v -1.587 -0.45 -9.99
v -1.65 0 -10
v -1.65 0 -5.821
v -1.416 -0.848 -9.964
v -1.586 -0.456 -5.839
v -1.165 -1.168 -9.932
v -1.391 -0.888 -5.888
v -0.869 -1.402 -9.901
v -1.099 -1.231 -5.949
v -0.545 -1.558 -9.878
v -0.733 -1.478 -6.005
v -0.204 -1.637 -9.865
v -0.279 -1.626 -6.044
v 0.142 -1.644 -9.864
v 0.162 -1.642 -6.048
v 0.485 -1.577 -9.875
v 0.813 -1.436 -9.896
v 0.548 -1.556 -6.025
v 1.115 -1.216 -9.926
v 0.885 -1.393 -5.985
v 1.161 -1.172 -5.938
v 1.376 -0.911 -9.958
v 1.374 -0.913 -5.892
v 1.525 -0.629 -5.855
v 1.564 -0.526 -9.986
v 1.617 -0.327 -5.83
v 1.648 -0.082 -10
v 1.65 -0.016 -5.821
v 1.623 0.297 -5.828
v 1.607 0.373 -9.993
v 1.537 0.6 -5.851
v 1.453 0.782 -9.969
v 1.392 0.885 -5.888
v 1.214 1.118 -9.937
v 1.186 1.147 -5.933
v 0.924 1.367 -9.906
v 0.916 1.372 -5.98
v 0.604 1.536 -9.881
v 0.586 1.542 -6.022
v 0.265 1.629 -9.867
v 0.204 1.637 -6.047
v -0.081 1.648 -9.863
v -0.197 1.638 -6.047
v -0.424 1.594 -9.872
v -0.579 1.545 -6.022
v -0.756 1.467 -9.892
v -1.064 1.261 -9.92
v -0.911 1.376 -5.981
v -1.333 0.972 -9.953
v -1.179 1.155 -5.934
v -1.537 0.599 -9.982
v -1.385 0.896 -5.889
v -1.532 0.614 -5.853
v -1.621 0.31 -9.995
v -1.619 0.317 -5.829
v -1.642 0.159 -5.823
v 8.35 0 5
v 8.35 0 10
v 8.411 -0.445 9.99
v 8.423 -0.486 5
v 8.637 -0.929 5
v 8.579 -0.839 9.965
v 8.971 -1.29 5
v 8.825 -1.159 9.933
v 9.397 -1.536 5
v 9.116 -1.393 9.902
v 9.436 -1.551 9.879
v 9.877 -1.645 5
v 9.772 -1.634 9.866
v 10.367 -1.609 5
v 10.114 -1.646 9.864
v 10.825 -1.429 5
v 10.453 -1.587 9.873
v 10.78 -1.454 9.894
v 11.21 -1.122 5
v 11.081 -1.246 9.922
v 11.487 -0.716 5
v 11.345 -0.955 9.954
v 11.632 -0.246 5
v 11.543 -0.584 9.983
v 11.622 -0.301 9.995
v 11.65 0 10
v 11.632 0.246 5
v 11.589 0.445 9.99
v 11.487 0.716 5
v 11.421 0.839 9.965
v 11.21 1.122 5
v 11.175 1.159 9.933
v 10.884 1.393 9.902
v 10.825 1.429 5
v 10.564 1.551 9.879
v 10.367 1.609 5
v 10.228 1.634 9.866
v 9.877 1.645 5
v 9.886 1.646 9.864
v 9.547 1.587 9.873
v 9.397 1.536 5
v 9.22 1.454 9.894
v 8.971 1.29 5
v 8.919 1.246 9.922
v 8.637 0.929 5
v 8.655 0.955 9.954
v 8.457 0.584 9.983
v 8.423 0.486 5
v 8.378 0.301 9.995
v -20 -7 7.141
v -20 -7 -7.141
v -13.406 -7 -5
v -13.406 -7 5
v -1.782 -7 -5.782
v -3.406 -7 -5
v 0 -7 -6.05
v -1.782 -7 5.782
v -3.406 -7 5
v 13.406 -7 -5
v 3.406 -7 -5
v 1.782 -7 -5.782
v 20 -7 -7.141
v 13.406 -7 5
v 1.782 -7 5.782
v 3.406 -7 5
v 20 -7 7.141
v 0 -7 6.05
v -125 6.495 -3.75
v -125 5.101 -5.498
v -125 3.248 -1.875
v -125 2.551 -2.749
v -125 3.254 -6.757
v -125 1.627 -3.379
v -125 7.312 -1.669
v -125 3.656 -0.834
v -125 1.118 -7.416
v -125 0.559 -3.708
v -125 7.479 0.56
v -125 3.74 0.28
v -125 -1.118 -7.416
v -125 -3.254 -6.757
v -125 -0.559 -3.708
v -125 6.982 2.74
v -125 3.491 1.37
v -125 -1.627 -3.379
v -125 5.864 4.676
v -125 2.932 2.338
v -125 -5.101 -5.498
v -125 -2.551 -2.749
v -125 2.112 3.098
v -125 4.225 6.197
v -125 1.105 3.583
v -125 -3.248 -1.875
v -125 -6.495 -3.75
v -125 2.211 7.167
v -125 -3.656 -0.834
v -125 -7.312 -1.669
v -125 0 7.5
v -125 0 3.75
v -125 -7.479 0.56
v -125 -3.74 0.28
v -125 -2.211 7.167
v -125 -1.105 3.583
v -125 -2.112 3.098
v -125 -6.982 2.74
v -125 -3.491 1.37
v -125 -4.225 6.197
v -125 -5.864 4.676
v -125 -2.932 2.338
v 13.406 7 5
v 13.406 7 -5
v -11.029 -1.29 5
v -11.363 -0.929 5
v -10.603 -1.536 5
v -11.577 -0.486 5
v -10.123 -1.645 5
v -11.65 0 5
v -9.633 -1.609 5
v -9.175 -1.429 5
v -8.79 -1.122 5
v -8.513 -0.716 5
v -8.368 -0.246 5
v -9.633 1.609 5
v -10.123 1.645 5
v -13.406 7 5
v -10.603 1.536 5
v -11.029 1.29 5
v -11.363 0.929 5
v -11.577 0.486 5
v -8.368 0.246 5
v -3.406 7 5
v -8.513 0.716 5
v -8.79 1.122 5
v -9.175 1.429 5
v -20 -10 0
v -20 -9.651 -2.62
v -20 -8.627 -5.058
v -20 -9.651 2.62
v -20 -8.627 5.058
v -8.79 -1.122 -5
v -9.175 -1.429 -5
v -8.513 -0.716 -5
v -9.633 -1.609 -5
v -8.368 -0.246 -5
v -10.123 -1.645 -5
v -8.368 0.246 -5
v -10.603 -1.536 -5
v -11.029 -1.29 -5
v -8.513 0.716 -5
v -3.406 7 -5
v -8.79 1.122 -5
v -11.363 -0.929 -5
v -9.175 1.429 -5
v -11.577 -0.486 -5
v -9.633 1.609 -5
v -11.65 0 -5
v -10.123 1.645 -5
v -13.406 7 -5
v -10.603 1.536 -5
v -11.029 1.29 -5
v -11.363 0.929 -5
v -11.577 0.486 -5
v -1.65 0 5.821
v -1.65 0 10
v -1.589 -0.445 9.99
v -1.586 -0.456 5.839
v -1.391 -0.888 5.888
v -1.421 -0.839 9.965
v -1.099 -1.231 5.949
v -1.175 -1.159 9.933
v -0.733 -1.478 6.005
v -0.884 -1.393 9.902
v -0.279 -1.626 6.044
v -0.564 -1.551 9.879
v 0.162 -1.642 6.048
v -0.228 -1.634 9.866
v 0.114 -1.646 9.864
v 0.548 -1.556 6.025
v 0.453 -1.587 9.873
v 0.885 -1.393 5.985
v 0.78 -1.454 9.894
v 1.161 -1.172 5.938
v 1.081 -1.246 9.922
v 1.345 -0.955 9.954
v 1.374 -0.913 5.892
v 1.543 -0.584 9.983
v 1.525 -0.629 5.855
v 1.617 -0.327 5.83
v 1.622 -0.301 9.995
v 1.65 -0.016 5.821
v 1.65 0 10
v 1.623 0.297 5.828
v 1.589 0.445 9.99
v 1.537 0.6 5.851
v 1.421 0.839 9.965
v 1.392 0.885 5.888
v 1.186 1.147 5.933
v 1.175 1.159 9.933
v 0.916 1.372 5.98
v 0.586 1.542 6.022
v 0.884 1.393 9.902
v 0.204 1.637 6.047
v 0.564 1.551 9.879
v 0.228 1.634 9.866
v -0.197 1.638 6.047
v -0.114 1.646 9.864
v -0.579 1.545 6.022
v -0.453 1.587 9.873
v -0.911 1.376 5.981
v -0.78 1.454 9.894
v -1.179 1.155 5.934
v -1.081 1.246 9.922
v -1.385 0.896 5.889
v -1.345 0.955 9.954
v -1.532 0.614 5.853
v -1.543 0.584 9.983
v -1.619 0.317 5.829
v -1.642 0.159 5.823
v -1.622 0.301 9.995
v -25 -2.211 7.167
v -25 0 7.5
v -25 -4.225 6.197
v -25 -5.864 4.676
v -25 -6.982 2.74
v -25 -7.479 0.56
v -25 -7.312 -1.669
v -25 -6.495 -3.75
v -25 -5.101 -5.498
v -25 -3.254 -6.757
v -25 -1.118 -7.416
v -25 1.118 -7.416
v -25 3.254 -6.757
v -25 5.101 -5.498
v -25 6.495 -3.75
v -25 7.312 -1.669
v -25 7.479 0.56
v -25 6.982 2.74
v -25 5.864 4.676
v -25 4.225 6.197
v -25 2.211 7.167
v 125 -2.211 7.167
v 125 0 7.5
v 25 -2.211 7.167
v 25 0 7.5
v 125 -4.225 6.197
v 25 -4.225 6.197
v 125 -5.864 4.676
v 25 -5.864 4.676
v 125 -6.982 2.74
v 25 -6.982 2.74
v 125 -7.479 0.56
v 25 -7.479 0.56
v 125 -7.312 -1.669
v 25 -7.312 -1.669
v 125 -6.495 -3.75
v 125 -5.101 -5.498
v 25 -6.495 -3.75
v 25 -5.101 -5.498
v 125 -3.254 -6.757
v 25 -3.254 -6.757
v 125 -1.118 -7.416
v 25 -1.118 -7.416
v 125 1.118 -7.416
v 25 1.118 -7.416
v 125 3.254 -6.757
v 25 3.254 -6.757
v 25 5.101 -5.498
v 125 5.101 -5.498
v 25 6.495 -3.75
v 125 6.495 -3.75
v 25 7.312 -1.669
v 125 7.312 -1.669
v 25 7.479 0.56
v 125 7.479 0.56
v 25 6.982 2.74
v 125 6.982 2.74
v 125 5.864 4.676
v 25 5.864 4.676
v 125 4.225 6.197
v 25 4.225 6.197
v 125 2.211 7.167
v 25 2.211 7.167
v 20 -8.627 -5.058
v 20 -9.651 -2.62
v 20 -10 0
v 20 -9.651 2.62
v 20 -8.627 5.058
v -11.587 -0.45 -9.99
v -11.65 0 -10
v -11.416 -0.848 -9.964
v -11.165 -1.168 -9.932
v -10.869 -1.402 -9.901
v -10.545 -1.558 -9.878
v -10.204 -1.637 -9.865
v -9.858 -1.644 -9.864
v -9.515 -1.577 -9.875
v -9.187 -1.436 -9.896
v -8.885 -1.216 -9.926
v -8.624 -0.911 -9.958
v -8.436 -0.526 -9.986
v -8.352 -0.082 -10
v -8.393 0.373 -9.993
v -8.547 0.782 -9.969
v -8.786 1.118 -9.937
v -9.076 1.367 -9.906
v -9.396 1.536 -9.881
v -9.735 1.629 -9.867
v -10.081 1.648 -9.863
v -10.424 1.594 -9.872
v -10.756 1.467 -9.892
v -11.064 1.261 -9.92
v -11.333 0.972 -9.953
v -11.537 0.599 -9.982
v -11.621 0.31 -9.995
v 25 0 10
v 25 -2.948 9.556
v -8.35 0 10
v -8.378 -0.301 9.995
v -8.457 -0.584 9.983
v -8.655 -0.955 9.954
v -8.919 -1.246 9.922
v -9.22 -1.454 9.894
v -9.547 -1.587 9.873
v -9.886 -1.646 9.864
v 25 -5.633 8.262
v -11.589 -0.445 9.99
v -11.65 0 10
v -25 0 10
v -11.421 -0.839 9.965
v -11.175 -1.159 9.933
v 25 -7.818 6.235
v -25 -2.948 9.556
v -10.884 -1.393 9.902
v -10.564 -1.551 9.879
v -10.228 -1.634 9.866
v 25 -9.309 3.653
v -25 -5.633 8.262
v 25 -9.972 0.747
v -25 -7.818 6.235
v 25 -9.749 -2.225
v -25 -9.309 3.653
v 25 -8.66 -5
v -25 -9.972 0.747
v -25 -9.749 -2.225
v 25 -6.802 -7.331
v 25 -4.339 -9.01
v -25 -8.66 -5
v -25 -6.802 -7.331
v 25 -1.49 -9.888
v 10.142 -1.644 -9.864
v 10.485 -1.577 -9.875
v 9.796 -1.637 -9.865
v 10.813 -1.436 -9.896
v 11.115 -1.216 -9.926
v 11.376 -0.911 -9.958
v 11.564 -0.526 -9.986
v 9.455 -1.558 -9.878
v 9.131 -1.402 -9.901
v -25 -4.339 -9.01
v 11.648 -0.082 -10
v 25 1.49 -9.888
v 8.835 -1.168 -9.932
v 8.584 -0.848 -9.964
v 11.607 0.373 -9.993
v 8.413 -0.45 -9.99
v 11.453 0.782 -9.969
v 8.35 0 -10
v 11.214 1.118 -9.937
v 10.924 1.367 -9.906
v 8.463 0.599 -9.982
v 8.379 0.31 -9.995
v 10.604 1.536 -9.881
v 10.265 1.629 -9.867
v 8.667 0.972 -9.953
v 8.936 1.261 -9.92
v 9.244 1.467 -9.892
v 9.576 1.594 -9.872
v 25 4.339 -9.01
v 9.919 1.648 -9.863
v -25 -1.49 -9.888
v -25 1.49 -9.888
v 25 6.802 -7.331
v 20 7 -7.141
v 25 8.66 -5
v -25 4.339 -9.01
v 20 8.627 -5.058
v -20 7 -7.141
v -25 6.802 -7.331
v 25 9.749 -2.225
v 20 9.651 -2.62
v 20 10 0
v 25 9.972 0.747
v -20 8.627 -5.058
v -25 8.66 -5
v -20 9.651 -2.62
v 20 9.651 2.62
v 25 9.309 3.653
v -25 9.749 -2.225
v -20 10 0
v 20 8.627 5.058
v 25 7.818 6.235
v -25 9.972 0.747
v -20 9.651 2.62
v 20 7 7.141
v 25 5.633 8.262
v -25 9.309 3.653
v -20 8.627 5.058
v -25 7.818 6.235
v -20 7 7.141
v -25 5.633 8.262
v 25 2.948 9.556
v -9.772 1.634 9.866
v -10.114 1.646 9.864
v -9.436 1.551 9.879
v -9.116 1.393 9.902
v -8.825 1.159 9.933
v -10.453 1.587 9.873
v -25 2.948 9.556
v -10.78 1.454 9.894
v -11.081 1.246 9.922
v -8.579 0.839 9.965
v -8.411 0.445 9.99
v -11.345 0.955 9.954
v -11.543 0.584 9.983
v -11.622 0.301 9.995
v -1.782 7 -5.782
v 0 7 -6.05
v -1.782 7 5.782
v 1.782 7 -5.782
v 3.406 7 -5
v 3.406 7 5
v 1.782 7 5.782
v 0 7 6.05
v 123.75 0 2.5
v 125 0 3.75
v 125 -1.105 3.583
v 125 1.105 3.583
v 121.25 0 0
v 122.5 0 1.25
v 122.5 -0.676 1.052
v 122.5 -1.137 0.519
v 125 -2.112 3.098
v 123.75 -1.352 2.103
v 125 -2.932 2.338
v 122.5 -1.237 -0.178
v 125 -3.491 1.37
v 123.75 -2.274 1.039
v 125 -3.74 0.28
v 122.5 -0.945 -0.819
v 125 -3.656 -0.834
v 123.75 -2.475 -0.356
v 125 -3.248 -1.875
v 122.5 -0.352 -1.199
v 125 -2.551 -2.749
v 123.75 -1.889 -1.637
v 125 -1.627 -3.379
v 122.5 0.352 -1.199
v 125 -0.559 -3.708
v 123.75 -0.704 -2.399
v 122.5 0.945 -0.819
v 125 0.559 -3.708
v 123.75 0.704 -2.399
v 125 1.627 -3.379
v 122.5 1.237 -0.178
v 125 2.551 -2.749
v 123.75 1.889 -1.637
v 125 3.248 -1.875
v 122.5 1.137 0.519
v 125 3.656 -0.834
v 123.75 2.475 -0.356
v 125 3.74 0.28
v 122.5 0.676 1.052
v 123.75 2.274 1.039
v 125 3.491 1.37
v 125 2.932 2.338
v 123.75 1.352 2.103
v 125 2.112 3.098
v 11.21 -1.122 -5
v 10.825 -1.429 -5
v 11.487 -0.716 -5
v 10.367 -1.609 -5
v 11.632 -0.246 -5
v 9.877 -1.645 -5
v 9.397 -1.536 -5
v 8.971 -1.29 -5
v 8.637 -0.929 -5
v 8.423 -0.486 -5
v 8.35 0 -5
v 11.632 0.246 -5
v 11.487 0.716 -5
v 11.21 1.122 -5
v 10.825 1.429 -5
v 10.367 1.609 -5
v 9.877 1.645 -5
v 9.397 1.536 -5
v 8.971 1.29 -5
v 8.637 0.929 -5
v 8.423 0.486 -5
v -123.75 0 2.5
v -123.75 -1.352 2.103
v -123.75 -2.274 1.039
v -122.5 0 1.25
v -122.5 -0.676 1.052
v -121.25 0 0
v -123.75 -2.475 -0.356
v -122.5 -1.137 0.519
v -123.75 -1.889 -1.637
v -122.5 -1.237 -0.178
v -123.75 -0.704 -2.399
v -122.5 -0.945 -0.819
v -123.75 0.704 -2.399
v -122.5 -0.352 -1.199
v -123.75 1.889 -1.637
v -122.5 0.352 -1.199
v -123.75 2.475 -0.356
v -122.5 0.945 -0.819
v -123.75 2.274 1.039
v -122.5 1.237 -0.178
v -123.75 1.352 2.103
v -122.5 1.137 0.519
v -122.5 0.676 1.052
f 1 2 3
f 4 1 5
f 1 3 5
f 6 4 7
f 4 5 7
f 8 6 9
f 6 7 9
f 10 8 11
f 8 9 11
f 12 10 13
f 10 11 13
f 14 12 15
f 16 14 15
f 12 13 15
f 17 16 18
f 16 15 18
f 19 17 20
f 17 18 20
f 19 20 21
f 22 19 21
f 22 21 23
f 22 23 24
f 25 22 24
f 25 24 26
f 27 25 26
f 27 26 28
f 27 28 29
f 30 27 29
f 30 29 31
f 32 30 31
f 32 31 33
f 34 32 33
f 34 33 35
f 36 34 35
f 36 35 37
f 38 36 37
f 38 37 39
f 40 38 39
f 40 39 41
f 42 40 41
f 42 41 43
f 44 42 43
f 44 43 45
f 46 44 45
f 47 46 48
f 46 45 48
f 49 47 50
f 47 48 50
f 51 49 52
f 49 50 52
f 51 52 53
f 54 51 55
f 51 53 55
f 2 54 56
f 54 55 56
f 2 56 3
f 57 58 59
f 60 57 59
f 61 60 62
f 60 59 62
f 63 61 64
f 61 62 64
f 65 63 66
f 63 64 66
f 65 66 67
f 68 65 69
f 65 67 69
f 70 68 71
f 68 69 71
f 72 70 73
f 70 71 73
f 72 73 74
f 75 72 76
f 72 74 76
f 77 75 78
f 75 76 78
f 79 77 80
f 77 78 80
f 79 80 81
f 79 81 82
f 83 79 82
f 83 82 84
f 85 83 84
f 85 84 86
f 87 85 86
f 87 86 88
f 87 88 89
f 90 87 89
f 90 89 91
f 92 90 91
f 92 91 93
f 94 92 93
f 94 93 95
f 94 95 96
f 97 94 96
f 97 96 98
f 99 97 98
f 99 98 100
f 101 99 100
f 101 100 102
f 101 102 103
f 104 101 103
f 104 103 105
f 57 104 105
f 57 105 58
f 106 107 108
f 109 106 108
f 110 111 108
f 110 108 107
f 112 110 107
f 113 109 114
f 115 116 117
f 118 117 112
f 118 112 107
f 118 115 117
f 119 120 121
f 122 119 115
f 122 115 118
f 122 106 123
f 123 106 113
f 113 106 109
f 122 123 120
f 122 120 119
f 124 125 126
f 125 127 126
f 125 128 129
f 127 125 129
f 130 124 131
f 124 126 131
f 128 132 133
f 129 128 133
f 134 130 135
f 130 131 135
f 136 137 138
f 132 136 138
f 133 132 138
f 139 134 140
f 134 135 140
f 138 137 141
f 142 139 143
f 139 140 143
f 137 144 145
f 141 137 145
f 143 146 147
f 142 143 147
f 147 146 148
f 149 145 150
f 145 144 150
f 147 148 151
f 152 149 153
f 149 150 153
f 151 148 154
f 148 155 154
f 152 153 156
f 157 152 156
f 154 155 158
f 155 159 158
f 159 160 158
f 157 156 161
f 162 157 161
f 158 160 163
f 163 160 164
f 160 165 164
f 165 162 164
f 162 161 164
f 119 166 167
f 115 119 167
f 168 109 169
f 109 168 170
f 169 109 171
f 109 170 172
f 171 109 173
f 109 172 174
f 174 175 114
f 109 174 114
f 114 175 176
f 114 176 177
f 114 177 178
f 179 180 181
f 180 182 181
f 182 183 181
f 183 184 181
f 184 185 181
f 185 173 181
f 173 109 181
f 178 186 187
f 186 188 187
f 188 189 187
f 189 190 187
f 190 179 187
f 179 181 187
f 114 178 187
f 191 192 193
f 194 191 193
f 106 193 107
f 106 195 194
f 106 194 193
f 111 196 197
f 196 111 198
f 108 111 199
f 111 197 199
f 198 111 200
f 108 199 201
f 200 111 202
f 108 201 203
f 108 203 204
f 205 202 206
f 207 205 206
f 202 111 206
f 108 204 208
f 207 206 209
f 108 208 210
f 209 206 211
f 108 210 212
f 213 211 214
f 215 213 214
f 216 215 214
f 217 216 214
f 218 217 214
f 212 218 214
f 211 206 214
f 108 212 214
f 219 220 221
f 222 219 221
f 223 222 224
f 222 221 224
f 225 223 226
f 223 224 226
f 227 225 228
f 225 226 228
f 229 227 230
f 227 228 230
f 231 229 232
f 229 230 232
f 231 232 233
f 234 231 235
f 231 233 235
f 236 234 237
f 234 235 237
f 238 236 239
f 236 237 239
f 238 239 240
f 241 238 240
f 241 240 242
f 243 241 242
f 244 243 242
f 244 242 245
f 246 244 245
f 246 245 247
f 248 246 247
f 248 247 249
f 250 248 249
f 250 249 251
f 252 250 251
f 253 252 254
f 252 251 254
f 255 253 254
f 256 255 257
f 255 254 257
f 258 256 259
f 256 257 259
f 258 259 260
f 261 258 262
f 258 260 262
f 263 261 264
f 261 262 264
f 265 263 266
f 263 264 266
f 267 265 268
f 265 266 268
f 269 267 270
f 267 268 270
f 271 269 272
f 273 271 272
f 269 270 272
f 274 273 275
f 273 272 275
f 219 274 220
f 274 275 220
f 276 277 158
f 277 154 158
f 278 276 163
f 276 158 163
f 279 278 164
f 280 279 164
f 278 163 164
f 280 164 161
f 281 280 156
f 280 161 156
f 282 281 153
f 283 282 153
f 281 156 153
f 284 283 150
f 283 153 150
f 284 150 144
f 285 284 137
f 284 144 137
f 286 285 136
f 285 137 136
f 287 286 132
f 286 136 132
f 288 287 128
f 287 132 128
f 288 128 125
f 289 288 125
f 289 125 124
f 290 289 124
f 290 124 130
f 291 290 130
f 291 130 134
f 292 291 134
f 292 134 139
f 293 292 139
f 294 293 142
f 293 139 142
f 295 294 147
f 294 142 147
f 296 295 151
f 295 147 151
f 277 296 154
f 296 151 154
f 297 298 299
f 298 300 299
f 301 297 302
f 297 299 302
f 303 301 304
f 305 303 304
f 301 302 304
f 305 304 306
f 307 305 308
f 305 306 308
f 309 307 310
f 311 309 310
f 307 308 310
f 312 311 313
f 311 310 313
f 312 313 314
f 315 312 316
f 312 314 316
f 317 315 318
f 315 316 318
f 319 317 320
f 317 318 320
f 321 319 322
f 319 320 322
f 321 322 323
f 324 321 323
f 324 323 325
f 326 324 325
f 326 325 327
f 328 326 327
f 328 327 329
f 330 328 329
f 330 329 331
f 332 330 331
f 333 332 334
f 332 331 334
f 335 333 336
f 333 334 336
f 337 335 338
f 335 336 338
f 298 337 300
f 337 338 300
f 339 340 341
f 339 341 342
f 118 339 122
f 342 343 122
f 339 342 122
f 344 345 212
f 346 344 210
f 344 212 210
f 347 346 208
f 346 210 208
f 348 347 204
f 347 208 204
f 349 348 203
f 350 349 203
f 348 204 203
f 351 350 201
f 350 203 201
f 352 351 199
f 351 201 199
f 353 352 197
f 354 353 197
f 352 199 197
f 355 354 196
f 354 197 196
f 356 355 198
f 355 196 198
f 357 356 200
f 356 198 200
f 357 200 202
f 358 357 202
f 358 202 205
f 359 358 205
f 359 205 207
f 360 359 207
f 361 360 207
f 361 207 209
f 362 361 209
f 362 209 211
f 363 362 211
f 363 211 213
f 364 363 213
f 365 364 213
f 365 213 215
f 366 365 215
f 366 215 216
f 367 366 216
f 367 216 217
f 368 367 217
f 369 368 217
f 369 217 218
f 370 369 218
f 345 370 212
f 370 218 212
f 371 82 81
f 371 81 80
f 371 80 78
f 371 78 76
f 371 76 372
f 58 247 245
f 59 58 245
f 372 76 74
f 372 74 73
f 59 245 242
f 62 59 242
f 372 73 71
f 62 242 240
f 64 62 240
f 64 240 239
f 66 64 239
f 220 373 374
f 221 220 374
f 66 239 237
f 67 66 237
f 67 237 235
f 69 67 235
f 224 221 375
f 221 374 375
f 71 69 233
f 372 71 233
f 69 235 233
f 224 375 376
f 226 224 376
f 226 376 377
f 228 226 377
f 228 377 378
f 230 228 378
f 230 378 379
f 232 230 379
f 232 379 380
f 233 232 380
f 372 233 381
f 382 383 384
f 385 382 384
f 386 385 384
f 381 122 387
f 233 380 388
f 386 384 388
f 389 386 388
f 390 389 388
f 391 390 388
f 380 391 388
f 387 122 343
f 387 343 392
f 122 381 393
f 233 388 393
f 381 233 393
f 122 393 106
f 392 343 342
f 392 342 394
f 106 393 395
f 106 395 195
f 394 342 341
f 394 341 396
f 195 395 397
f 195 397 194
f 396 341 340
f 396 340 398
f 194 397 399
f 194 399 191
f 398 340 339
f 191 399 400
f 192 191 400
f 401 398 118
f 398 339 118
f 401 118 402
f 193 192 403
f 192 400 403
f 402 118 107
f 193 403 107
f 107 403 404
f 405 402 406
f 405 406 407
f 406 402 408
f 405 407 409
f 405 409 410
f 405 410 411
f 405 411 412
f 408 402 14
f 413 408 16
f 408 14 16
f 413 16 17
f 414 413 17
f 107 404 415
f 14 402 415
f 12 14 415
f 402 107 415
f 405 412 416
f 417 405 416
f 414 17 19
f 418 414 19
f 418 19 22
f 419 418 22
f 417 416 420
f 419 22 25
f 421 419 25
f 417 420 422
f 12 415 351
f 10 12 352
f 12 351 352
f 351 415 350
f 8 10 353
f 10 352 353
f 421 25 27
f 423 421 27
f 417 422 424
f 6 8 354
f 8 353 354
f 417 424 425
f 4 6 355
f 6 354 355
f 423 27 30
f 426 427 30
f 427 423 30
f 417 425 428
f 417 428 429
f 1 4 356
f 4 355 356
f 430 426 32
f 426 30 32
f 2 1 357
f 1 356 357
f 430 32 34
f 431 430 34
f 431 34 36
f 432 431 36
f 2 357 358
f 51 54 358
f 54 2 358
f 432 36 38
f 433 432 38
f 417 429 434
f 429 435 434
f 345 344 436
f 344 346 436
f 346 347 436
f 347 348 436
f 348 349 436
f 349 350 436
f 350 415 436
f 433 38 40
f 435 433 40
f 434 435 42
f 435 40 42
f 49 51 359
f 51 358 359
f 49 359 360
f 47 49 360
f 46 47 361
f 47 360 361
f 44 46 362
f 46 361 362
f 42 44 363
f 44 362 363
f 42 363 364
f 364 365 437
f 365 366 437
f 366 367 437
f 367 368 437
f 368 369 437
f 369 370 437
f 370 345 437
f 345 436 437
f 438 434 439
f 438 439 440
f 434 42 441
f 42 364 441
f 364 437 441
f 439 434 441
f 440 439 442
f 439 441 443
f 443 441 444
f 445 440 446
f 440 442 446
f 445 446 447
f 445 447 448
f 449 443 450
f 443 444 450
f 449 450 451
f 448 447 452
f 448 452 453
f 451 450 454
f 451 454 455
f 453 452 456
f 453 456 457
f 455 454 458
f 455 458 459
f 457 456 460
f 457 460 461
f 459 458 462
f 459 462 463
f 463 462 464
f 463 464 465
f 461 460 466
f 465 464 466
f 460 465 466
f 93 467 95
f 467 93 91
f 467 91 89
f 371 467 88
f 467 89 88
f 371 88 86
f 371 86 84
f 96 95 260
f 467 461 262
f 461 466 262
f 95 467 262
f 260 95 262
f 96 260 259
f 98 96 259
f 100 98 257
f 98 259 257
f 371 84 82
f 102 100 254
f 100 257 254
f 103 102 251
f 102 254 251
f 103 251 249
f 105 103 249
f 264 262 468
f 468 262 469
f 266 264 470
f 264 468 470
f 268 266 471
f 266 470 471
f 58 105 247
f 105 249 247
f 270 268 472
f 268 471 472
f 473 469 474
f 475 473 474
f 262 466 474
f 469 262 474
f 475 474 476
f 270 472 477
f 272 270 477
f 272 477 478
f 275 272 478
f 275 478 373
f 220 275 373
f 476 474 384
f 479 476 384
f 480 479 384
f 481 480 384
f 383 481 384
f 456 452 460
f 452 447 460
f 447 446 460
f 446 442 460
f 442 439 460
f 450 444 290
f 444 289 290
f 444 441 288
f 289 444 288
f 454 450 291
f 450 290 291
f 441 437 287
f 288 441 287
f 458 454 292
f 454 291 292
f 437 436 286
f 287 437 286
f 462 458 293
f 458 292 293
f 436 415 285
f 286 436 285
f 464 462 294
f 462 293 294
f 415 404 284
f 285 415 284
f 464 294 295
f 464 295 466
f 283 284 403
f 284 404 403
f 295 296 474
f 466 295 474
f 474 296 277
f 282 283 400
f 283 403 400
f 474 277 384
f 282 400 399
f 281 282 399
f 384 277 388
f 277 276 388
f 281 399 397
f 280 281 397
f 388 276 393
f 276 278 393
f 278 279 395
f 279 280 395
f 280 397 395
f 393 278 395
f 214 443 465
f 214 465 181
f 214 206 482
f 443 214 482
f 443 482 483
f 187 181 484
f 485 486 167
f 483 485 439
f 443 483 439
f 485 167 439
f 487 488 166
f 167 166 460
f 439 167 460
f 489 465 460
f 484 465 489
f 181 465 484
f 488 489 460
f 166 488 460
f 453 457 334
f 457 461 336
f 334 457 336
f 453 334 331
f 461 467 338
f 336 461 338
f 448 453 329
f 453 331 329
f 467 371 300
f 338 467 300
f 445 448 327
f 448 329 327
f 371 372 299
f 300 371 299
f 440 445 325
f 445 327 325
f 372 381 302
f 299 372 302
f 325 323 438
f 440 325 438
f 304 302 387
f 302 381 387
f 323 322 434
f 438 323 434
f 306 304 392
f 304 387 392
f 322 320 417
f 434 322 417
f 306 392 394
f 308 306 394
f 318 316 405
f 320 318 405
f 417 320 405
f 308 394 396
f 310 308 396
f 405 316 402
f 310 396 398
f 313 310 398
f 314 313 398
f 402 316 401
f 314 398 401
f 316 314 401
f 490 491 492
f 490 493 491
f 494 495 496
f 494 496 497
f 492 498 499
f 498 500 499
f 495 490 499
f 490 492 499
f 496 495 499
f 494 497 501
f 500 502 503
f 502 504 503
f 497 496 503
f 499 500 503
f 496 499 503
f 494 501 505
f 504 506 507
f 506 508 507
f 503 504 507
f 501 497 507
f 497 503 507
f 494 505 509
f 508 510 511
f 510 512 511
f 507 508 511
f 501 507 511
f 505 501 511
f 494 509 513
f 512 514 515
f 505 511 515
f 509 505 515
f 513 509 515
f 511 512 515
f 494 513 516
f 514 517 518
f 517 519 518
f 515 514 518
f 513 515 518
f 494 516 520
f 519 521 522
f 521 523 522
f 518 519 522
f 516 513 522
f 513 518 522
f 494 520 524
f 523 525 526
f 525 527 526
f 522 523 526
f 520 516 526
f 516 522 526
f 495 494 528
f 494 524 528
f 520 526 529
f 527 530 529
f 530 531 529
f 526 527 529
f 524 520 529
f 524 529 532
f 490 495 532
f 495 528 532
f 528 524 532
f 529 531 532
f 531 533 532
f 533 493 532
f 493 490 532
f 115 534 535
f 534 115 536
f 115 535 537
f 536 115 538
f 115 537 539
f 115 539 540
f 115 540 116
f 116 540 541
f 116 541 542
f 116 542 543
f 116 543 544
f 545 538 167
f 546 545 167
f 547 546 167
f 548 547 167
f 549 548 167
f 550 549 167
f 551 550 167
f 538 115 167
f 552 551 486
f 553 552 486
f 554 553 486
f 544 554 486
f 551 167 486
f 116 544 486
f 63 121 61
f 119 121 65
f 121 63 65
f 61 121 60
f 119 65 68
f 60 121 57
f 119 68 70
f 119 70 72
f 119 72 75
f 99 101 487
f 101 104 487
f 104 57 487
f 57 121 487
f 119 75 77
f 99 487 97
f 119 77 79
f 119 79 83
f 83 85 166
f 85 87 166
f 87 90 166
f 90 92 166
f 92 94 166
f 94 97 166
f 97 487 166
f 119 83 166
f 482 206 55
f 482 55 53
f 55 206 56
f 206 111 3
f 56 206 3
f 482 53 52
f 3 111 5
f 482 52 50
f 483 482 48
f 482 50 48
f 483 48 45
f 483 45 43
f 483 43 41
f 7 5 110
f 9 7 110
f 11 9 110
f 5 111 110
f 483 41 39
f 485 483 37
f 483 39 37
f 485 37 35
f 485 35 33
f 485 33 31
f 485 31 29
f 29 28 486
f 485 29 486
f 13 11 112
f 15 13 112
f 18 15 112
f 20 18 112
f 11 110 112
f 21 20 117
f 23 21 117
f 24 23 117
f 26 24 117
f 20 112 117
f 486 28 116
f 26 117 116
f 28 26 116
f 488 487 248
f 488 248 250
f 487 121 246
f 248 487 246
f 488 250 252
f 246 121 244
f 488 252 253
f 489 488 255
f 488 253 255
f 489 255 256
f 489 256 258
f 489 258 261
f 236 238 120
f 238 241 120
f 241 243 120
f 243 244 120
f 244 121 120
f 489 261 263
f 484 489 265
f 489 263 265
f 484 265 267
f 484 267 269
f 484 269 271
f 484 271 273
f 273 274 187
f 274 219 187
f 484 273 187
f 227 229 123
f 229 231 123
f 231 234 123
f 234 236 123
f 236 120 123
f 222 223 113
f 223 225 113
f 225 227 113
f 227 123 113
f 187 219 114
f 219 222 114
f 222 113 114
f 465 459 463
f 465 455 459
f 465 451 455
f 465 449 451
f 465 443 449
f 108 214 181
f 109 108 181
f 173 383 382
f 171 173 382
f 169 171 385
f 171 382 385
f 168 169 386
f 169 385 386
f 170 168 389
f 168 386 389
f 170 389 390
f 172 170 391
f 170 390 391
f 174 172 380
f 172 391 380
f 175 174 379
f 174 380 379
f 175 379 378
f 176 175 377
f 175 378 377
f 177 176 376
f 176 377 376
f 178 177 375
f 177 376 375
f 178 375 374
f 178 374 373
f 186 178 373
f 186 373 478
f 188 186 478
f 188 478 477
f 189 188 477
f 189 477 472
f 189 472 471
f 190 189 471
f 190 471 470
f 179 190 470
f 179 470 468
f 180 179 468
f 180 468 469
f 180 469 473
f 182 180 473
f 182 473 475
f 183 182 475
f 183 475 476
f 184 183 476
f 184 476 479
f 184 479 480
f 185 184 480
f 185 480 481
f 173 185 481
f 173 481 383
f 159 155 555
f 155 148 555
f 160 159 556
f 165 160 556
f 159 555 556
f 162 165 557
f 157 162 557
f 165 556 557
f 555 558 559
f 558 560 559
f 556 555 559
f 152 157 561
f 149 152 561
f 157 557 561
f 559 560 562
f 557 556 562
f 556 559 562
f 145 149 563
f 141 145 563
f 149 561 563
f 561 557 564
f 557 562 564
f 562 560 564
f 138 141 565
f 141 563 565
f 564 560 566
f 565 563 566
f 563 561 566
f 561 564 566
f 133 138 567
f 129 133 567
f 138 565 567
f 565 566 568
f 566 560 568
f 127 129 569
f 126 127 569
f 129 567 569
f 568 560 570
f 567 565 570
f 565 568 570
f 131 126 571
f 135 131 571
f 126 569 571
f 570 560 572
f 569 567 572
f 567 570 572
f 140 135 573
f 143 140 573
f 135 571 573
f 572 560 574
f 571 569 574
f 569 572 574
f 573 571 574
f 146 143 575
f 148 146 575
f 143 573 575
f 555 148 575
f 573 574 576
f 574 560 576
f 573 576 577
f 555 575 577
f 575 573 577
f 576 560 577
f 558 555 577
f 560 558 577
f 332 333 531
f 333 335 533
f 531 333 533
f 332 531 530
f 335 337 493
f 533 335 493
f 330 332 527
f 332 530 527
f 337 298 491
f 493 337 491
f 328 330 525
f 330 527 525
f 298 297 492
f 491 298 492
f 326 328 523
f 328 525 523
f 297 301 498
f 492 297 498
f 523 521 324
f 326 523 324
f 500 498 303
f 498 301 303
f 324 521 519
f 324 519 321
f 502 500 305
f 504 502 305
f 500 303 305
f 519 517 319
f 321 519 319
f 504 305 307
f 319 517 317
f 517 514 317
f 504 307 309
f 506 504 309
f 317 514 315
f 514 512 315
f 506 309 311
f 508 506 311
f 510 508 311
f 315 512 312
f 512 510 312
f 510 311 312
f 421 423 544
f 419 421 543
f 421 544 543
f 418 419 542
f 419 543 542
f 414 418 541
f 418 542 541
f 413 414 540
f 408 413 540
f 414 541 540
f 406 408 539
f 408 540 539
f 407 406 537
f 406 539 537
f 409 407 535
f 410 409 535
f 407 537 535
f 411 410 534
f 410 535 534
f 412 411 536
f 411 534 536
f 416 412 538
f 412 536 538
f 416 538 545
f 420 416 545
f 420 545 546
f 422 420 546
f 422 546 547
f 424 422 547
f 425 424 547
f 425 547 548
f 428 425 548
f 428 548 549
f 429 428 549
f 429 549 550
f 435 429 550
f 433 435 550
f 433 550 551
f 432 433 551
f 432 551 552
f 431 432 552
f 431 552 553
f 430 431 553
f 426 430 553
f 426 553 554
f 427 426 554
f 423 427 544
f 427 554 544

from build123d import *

# Parameters (mm, degrees)
F3_W      = 40
F3_H      = 5
F4_DEPTH  = 35.001
F6_D      = 12.1
F9_D      = 3.3
F11_DEPTH = 17.0010001


with BuildPart() as f1:
    # F0 (on Front) → F1 (revolve)
    with BuildSketch(Plane.XZ):
        Polygon((-125, 7.5), (-125, 3.75), (-121.25, 0), (121.25, 0), (125, 3.75), (125, 7.5), (25, 7.5), (25, 10), (-25, 10), (-25, 7.5), align=None)
    revolve(axis=Axis((-80.2068784833, 0, 0), (1, 0, 0)))

    # F3 (on offset) → F4 (cut, through all)
    with BuildSketch(Plane.XY.offset(25)):
        with Locations((0, 9.5)):
            Rectangle(F3_W, F3_H)
        with Locations((0, -9.5)):
            Rectangle(F3_W, F3_H)
    extrude(amount=-F4_DEPTH, mode=Mode.SUBTRACT)

    # F6 (through all)
    with Locations(Plane(origin=(0, 7, 0), x_dir=(-1, 0, 0), z_dir=(0, 1, 0))):
        with Locations((0, 0)):
            Hole(F6_D / 2)

    # F9 (through all)
    with Locations(Plane(origin=(0, 0, -10), x_dir=(1, 0, 0), z_dir=(0, 0, -1))):
        with Locations((0, 0), (-10, 0), (10, 0)):
            Hole(F9_D / 2)

    # F10 (on face) → F11 (cut, through all)
    with BuildSketch(Plane(origin=(0, 7, 0), x_dir=(-1, 0, 0), z_dir=(0, 1, 0))):
        with BuildLine():
            Line((3.4062442661, -5), (13.4062442661, -5))
            Line((13.4062442661, -5), (13.4062442661, 5))
            Line((13.4062442661, 5), (3.4062442661, 5))
            ThreePointArc((3.4062442661, 5), (6.05, 0), (3.4062442661, -5))
        make_face()
        with BuildLine():
            Line((-13.4062442661, 5), (-13.4062442661, -5))
            Line((-13.4062442661, -5), (-3.4062442661, -5))
            ThreePointArc((-3.4062442661, -5), (-6.05, 0), (-3.4062442661, 5))
            Line((-3.4062442661, 5), (-13.4062442661, 5))
        make_face()
    extrude(amount=-F11_DEPTH, mode=Mode.SUBTRACT)


solid = f1.part
